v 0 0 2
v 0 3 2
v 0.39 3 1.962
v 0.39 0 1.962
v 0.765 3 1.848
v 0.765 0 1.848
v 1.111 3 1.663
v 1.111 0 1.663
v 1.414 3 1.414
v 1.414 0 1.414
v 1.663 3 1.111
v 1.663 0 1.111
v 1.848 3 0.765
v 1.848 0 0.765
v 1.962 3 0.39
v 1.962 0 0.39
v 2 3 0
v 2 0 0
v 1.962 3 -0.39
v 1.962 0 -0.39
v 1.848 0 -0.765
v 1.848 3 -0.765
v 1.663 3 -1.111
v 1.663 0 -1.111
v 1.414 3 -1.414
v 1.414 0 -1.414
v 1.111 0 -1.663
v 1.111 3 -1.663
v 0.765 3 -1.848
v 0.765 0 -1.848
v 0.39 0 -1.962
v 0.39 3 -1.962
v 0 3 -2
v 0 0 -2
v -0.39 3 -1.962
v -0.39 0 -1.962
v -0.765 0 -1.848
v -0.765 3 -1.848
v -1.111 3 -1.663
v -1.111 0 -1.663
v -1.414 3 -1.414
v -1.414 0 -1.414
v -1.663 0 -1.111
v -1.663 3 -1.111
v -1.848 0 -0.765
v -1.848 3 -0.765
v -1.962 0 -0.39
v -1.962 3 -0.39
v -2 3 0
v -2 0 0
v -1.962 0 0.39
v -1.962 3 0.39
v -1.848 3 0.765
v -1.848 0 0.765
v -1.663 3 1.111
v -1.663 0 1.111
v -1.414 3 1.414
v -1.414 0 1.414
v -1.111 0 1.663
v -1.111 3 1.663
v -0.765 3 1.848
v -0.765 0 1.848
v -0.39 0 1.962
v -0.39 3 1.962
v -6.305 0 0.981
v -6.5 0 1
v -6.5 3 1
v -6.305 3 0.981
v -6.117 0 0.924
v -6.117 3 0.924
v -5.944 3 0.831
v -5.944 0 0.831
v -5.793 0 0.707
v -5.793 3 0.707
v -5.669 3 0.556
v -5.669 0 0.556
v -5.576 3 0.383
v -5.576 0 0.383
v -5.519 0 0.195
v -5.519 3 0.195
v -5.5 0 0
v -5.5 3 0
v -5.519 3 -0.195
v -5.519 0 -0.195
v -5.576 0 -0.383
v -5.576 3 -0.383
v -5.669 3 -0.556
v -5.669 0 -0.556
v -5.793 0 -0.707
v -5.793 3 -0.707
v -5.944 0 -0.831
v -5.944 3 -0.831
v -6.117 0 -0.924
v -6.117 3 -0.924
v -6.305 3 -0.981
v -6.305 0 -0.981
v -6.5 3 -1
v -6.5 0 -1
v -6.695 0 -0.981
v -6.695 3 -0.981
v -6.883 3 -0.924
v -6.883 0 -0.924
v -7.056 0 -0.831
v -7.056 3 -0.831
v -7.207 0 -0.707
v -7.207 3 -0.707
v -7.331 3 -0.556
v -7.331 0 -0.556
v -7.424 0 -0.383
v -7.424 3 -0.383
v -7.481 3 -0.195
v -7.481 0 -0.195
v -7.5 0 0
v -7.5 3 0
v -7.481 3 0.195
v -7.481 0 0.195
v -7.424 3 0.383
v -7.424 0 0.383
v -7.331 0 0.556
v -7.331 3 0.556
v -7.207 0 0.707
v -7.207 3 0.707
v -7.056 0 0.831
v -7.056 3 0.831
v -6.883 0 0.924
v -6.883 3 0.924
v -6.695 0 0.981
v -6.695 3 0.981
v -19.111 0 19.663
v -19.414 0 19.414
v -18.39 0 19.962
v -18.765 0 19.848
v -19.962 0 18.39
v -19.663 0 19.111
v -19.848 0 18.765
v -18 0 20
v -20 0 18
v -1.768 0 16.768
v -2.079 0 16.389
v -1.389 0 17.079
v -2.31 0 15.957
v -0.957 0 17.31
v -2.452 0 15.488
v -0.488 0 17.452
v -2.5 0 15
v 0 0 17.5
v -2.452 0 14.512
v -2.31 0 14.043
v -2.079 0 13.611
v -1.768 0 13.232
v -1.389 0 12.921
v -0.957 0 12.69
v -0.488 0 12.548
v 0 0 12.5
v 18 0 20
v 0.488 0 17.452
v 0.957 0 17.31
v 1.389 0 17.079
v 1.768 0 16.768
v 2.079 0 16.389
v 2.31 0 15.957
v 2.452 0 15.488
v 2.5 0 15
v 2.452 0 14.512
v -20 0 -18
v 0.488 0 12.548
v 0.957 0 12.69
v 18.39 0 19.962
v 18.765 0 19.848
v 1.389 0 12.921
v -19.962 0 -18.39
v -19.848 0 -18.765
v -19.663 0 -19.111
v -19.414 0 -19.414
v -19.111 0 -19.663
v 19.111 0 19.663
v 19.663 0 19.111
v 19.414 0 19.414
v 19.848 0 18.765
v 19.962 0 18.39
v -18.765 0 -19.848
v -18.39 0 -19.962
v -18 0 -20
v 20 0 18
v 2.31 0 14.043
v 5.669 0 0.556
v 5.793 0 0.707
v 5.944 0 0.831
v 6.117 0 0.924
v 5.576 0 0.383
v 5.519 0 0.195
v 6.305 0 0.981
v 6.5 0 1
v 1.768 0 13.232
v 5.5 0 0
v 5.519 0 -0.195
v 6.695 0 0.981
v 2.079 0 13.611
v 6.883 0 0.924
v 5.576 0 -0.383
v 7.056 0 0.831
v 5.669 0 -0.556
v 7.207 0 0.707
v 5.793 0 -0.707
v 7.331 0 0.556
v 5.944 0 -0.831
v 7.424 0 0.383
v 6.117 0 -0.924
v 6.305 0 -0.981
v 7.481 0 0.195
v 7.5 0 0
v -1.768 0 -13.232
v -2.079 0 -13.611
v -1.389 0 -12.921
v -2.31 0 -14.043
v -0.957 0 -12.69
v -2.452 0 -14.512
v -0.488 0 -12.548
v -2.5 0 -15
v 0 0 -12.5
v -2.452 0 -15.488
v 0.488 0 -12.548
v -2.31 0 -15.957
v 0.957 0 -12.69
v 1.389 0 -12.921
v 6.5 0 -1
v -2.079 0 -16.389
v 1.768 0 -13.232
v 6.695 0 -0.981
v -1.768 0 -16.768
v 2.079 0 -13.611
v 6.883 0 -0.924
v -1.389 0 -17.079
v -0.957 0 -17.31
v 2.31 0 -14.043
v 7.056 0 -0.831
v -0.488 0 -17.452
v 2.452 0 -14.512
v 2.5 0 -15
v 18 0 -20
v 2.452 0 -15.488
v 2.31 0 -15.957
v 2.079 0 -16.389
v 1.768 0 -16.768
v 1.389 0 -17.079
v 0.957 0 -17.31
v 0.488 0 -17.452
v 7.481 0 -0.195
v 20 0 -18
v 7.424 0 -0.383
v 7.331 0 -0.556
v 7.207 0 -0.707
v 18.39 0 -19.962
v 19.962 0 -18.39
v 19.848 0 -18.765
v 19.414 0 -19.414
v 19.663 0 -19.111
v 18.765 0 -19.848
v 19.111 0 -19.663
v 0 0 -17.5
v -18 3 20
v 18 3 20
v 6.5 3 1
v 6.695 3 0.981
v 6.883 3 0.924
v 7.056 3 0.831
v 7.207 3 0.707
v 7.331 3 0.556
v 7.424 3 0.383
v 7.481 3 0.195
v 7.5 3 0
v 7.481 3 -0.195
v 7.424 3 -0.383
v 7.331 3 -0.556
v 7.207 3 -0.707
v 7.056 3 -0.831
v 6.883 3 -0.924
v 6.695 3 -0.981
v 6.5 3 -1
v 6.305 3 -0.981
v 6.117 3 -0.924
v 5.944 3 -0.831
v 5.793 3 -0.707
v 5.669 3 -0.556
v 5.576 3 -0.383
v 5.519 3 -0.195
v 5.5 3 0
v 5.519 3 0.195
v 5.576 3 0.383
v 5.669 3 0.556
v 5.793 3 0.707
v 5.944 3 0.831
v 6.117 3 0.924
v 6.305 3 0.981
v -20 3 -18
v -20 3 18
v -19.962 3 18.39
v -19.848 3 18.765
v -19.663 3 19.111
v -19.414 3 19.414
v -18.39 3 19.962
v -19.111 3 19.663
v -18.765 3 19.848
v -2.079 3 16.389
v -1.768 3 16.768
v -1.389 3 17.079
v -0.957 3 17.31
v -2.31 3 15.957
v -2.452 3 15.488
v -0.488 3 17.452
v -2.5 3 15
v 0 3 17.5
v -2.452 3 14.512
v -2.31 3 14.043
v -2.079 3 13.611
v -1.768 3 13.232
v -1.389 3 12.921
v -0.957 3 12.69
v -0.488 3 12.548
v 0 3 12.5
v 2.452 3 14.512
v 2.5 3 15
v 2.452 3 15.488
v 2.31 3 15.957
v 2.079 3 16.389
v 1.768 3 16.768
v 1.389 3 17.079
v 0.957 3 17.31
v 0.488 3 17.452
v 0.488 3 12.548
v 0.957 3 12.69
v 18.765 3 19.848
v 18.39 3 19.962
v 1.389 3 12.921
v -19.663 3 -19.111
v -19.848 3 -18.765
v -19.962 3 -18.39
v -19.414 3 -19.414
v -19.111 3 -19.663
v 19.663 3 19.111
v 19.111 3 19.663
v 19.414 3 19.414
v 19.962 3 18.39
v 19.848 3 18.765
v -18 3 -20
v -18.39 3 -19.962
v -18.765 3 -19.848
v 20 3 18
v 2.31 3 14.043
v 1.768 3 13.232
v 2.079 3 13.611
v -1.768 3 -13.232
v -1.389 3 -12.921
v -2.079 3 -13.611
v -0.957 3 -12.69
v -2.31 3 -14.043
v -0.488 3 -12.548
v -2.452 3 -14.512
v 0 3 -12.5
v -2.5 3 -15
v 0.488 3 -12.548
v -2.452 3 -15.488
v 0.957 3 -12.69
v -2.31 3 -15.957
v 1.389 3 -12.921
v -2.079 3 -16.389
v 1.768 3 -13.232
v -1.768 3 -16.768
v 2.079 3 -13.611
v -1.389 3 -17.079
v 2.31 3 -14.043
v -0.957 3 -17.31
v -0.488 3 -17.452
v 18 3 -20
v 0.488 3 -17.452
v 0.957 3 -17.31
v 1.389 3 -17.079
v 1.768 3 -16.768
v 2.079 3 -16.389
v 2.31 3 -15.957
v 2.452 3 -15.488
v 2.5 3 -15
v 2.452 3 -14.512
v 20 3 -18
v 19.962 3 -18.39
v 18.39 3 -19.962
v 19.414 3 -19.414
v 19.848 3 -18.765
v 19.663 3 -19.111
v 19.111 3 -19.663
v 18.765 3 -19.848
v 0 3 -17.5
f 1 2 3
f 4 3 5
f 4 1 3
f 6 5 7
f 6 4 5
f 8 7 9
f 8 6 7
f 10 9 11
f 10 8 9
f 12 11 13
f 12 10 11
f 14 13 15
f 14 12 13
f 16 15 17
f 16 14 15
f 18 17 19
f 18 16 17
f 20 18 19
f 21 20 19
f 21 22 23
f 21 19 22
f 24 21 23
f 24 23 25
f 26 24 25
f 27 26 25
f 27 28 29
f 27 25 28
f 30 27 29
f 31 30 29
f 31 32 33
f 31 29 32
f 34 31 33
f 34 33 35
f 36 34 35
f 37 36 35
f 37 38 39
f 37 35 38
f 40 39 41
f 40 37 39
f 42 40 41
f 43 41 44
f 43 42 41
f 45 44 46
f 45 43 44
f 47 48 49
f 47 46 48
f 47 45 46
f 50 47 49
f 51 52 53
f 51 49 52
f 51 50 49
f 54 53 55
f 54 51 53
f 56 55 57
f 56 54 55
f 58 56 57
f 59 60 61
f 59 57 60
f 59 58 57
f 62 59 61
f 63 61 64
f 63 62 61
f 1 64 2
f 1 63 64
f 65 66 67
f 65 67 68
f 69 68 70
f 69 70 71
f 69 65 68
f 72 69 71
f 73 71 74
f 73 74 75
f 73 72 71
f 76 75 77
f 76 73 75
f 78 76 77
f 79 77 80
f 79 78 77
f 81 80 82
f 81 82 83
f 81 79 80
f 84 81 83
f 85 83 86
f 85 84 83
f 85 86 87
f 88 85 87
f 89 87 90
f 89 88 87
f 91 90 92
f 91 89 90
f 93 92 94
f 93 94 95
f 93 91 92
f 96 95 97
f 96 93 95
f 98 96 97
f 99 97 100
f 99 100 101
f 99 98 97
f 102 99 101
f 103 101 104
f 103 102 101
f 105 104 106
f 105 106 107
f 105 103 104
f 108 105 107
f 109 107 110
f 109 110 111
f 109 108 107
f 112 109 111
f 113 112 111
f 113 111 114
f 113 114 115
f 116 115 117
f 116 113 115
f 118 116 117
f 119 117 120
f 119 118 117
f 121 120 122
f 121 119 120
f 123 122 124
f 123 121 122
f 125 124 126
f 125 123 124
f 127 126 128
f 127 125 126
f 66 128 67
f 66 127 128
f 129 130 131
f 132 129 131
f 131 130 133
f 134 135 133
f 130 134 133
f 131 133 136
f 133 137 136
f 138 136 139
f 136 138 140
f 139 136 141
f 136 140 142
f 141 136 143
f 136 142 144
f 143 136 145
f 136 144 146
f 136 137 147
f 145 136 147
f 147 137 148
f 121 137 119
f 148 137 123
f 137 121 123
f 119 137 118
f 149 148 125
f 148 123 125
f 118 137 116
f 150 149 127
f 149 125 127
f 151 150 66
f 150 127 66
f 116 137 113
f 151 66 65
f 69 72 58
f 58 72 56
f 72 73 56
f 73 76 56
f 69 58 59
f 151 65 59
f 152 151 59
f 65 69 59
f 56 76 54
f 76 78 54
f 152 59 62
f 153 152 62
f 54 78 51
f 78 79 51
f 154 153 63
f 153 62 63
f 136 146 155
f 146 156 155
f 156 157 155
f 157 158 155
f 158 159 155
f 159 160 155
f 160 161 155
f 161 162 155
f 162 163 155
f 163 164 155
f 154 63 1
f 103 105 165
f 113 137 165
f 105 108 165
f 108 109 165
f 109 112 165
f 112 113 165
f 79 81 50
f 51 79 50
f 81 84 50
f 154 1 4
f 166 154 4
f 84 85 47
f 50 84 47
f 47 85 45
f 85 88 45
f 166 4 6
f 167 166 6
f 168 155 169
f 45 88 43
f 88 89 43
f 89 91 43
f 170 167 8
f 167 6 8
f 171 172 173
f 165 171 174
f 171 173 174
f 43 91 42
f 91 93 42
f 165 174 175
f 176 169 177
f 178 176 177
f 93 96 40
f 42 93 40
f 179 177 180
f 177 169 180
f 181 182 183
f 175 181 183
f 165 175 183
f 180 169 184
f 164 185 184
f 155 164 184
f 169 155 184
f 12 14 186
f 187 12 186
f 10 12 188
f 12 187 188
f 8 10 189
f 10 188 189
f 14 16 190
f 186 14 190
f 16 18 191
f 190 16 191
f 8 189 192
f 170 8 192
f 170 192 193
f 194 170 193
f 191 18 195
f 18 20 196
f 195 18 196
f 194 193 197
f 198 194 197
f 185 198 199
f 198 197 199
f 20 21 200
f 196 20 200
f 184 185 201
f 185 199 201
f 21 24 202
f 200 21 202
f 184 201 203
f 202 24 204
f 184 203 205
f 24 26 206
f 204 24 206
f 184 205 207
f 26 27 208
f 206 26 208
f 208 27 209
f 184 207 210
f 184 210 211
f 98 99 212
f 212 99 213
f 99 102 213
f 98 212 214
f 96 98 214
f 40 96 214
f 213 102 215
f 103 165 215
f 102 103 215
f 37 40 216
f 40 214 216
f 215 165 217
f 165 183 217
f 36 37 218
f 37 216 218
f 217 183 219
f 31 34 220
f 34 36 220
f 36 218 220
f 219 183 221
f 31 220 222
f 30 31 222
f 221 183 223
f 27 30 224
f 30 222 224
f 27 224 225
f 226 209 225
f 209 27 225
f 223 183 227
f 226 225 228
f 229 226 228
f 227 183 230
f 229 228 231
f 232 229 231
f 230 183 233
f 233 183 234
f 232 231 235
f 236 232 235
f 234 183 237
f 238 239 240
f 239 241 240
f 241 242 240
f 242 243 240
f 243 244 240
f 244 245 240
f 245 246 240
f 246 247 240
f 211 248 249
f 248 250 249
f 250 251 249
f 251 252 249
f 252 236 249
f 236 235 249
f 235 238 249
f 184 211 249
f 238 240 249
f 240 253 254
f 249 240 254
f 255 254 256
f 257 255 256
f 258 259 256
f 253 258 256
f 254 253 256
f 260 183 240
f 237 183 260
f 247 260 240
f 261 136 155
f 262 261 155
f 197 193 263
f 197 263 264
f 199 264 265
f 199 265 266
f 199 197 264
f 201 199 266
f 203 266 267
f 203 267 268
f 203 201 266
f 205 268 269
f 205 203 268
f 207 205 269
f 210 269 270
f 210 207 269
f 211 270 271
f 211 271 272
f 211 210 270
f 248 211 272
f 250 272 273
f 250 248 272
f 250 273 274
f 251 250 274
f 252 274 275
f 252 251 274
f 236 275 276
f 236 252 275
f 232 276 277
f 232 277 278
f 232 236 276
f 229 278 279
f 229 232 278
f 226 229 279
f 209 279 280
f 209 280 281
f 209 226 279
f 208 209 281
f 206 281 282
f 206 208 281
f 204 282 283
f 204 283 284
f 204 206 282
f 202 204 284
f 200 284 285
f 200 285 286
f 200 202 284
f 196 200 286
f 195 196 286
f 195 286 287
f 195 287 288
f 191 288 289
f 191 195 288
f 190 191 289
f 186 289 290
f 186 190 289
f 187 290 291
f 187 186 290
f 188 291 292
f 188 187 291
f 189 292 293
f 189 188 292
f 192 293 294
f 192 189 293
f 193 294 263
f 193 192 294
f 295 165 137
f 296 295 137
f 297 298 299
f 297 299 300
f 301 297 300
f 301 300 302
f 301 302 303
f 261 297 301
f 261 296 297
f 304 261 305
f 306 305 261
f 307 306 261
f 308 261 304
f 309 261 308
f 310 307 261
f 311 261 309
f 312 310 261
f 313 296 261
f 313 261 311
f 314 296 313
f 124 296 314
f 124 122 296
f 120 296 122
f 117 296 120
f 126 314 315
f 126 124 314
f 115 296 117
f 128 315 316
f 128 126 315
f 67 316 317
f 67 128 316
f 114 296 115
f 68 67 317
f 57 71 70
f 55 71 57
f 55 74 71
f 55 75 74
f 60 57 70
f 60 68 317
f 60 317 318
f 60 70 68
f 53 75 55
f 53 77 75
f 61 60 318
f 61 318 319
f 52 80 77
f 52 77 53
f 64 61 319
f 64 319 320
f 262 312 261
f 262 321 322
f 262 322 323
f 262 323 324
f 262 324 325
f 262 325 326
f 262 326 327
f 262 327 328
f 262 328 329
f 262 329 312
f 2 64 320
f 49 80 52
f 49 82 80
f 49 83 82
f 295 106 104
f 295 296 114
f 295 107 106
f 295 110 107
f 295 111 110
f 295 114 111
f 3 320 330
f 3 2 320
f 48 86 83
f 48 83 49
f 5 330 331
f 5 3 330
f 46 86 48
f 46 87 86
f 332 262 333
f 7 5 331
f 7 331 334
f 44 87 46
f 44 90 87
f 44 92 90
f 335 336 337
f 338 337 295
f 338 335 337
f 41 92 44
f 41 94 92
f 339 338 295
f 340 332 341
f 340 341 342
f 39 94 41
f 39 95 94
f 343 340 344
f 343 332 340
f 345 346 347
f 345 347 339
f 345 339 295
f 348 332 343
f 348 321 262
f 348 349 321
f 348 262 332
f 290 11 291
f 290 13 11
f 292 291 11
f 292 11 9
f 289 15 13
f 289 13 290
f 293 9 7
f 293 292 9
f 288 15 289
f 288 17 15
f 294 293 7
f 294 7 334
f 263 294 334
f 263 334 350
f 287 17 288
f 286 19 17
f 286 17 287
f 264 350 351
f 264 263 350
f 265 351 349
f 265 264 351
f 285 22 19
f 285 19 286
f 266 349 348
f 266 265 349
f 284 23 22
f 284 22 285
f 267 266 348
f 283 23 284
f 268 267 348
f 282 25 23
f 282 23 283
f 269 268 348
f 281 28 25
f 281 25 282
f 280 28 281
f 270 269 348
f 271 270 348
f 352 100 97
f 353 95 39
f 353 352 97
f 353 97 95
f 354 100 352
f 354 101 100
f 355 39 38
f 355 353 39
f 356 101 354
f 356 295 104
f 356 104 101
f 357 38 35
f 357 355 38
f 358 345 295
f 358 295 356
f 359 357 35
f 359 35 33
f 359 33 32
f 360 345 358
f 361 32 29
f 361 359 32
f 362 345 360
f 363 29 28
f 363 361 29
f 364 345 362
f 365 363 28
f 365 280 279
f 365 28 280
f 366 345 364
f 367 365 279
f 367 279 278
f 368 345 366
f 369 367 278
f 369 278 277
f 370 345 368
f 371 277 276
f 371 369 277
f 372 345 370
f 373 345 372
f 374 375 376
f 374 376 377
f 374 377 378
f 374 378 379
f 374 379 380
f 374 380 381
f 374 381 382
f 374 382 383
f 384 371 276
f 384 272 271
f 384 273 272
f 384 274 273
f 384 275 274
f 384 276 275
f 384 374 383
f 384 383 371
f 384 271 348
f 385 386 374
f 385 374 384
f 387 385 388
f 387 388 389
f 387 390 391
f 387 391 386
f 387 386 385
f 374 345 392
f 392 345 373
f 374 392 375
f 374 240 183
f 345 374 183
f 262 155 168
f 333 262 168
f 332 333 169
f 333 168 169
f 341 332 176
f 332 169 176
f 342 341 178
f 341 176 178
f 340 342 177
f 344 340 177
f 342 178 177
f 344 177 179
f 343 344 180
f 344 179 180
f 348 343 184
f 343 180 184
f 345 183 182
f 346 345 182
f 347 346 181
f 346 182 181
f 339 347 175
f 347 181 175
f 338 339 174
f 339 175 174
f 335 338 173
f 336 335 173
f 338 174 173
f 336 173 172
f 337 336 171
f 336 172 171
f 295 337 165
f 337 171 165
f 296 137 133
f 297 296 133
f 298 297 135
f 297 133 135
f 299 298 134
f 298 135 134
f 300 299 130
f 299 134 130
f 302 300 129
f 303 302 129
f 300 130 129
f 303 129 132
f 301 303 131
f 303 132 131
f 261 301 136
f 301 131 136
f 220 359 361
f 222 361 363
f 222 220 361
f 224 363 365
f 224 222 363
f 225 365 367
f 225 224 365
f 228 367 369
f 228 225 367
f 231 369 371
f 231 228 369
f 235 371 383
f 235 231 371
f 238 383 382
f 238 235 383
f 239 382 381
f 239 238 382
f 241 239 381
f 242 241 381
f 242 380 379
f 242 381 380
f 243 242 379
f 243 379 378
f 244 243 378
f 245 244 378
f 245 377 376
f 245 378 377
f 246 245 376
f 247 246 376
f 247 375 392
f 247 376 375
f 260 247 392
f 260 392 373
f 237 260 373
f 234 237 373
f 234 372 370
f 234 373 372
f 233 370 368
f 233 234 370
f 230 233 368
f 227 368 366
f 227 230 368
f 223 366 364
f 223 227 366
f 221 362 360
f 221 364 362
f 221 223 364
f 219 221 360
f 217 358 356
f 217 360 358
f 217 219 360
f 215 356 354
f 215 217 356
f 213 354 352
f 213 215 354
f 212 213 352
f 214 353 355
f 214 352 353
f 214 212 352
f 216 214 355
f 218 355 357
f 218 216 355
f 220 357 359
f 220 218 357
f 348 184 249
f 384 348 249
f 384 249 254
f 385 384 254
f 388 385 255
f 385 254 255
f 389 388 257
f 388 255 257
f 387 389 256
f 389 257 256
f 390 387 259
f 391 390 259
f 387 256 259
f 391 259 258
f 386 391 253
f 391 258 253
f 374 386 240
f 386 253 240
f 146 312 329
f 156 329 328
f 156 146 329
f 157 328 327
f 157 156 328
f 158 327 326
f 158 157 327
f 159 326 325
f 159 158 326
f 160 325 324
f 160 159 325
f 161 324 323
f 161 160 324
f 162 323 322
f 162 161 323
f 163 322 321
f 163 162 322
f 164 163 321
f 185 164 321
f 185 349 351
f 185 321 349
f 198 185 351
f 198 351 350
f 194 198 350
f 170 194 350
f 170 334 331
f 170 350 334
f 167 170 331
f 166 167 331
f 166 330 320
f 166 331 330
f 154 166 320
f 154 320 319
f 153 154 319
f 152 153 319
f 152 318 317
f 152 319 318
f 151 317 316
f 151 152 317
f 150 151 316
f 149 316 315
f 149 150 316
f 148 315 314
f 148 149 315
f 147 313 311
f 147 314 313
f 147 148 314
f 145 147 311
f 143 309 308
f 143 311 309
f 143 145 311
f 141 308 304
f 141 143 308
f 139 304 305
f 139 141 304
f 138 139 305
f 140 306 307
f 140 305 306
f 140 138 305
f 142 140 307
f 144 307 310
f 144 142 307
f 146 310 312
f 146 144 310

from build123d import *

# Parameters (mm, degrees)
BOSS_EXTRUDE1_DEPTH = 3
SKETCH3_R           = 2
SKETCH3_R_2         = 2.5
CUT_EXTRUDE3_DEPTH  = 29.442925307
SKETCH4_R           = 1
CUT_EXTRUDE4_DEPTH  = 3


with BuildPart() as part:
    # Sketch2 → Boss-Extrude1 (new body)
    with BuildSketch(Plane(origin=(0, 0, 0), x_dir=(1, 0, 0), z_dir=(0, 1, 0))):
        with BuildLine():
            Line((-18, -20), (18, -20))
            ThreePointArc((18, -20), (19.414213562, -19.414213562), (20, -18))
            Line((20, -18), (20, 18))
            ThreePointArc((20, 18), (19.414213562, 19.414213562), (18, 20))
            Line((18, 20), (-18, 20))
            ThreePointArc((-18, 20), (-19.414213562, 19.414213562), (-20, 18))
            Line((-20, 18), (-20, -18))
            ThreePointArc((-20, -18), (-19.414213562, -19.414213562), (-18, -20))
        make_face()
    extrude(amount=BOSS_EXTRUDE1_DEPTH)

    # Sketch3 → Cut-Extrude3 (cut, through all)
    with BuildSketch(Plane(origin=(0, 0, 0), x_dir=(1, 0, 0), z_dir=(0, 1, 0))):
        with Locations(Location((0, 0, 0), (0, 0, 270))):
            Circle(SKETCH3_R)
        with Locations(Location((0, 15, 0), (0, 0, 270))):
            Circle(SKETCH3_R_2)
        with Locations(Location((0, -15, 0), (0, 0, 270))):
            Circle(SKETCH3_R_2)
    extrude(amount=CUT_EXTRUDE3_DEPTH, mode=Mode.SUBTRACT)

    # Sketch4 → Cut-Extrude4 (cut)
    with BuildSketch(Plane(origin=(0, 0, 0), x_dir=(1, 0, 0), z_dir=(0, 1, 0))):
        with Locations(Location((6.5, 0, 0), (0, 0, 270))):
            Circle(SKETCH4_R)
        with Locations(Location((-6.5, 0, 0), (0, 0, 270))):
            Circle(SKETCH4_R)
    extrude(amount=CUT_EXTRUDE4_DEPTH, mode=Mode.SUBTRACT)


solid = part.part
